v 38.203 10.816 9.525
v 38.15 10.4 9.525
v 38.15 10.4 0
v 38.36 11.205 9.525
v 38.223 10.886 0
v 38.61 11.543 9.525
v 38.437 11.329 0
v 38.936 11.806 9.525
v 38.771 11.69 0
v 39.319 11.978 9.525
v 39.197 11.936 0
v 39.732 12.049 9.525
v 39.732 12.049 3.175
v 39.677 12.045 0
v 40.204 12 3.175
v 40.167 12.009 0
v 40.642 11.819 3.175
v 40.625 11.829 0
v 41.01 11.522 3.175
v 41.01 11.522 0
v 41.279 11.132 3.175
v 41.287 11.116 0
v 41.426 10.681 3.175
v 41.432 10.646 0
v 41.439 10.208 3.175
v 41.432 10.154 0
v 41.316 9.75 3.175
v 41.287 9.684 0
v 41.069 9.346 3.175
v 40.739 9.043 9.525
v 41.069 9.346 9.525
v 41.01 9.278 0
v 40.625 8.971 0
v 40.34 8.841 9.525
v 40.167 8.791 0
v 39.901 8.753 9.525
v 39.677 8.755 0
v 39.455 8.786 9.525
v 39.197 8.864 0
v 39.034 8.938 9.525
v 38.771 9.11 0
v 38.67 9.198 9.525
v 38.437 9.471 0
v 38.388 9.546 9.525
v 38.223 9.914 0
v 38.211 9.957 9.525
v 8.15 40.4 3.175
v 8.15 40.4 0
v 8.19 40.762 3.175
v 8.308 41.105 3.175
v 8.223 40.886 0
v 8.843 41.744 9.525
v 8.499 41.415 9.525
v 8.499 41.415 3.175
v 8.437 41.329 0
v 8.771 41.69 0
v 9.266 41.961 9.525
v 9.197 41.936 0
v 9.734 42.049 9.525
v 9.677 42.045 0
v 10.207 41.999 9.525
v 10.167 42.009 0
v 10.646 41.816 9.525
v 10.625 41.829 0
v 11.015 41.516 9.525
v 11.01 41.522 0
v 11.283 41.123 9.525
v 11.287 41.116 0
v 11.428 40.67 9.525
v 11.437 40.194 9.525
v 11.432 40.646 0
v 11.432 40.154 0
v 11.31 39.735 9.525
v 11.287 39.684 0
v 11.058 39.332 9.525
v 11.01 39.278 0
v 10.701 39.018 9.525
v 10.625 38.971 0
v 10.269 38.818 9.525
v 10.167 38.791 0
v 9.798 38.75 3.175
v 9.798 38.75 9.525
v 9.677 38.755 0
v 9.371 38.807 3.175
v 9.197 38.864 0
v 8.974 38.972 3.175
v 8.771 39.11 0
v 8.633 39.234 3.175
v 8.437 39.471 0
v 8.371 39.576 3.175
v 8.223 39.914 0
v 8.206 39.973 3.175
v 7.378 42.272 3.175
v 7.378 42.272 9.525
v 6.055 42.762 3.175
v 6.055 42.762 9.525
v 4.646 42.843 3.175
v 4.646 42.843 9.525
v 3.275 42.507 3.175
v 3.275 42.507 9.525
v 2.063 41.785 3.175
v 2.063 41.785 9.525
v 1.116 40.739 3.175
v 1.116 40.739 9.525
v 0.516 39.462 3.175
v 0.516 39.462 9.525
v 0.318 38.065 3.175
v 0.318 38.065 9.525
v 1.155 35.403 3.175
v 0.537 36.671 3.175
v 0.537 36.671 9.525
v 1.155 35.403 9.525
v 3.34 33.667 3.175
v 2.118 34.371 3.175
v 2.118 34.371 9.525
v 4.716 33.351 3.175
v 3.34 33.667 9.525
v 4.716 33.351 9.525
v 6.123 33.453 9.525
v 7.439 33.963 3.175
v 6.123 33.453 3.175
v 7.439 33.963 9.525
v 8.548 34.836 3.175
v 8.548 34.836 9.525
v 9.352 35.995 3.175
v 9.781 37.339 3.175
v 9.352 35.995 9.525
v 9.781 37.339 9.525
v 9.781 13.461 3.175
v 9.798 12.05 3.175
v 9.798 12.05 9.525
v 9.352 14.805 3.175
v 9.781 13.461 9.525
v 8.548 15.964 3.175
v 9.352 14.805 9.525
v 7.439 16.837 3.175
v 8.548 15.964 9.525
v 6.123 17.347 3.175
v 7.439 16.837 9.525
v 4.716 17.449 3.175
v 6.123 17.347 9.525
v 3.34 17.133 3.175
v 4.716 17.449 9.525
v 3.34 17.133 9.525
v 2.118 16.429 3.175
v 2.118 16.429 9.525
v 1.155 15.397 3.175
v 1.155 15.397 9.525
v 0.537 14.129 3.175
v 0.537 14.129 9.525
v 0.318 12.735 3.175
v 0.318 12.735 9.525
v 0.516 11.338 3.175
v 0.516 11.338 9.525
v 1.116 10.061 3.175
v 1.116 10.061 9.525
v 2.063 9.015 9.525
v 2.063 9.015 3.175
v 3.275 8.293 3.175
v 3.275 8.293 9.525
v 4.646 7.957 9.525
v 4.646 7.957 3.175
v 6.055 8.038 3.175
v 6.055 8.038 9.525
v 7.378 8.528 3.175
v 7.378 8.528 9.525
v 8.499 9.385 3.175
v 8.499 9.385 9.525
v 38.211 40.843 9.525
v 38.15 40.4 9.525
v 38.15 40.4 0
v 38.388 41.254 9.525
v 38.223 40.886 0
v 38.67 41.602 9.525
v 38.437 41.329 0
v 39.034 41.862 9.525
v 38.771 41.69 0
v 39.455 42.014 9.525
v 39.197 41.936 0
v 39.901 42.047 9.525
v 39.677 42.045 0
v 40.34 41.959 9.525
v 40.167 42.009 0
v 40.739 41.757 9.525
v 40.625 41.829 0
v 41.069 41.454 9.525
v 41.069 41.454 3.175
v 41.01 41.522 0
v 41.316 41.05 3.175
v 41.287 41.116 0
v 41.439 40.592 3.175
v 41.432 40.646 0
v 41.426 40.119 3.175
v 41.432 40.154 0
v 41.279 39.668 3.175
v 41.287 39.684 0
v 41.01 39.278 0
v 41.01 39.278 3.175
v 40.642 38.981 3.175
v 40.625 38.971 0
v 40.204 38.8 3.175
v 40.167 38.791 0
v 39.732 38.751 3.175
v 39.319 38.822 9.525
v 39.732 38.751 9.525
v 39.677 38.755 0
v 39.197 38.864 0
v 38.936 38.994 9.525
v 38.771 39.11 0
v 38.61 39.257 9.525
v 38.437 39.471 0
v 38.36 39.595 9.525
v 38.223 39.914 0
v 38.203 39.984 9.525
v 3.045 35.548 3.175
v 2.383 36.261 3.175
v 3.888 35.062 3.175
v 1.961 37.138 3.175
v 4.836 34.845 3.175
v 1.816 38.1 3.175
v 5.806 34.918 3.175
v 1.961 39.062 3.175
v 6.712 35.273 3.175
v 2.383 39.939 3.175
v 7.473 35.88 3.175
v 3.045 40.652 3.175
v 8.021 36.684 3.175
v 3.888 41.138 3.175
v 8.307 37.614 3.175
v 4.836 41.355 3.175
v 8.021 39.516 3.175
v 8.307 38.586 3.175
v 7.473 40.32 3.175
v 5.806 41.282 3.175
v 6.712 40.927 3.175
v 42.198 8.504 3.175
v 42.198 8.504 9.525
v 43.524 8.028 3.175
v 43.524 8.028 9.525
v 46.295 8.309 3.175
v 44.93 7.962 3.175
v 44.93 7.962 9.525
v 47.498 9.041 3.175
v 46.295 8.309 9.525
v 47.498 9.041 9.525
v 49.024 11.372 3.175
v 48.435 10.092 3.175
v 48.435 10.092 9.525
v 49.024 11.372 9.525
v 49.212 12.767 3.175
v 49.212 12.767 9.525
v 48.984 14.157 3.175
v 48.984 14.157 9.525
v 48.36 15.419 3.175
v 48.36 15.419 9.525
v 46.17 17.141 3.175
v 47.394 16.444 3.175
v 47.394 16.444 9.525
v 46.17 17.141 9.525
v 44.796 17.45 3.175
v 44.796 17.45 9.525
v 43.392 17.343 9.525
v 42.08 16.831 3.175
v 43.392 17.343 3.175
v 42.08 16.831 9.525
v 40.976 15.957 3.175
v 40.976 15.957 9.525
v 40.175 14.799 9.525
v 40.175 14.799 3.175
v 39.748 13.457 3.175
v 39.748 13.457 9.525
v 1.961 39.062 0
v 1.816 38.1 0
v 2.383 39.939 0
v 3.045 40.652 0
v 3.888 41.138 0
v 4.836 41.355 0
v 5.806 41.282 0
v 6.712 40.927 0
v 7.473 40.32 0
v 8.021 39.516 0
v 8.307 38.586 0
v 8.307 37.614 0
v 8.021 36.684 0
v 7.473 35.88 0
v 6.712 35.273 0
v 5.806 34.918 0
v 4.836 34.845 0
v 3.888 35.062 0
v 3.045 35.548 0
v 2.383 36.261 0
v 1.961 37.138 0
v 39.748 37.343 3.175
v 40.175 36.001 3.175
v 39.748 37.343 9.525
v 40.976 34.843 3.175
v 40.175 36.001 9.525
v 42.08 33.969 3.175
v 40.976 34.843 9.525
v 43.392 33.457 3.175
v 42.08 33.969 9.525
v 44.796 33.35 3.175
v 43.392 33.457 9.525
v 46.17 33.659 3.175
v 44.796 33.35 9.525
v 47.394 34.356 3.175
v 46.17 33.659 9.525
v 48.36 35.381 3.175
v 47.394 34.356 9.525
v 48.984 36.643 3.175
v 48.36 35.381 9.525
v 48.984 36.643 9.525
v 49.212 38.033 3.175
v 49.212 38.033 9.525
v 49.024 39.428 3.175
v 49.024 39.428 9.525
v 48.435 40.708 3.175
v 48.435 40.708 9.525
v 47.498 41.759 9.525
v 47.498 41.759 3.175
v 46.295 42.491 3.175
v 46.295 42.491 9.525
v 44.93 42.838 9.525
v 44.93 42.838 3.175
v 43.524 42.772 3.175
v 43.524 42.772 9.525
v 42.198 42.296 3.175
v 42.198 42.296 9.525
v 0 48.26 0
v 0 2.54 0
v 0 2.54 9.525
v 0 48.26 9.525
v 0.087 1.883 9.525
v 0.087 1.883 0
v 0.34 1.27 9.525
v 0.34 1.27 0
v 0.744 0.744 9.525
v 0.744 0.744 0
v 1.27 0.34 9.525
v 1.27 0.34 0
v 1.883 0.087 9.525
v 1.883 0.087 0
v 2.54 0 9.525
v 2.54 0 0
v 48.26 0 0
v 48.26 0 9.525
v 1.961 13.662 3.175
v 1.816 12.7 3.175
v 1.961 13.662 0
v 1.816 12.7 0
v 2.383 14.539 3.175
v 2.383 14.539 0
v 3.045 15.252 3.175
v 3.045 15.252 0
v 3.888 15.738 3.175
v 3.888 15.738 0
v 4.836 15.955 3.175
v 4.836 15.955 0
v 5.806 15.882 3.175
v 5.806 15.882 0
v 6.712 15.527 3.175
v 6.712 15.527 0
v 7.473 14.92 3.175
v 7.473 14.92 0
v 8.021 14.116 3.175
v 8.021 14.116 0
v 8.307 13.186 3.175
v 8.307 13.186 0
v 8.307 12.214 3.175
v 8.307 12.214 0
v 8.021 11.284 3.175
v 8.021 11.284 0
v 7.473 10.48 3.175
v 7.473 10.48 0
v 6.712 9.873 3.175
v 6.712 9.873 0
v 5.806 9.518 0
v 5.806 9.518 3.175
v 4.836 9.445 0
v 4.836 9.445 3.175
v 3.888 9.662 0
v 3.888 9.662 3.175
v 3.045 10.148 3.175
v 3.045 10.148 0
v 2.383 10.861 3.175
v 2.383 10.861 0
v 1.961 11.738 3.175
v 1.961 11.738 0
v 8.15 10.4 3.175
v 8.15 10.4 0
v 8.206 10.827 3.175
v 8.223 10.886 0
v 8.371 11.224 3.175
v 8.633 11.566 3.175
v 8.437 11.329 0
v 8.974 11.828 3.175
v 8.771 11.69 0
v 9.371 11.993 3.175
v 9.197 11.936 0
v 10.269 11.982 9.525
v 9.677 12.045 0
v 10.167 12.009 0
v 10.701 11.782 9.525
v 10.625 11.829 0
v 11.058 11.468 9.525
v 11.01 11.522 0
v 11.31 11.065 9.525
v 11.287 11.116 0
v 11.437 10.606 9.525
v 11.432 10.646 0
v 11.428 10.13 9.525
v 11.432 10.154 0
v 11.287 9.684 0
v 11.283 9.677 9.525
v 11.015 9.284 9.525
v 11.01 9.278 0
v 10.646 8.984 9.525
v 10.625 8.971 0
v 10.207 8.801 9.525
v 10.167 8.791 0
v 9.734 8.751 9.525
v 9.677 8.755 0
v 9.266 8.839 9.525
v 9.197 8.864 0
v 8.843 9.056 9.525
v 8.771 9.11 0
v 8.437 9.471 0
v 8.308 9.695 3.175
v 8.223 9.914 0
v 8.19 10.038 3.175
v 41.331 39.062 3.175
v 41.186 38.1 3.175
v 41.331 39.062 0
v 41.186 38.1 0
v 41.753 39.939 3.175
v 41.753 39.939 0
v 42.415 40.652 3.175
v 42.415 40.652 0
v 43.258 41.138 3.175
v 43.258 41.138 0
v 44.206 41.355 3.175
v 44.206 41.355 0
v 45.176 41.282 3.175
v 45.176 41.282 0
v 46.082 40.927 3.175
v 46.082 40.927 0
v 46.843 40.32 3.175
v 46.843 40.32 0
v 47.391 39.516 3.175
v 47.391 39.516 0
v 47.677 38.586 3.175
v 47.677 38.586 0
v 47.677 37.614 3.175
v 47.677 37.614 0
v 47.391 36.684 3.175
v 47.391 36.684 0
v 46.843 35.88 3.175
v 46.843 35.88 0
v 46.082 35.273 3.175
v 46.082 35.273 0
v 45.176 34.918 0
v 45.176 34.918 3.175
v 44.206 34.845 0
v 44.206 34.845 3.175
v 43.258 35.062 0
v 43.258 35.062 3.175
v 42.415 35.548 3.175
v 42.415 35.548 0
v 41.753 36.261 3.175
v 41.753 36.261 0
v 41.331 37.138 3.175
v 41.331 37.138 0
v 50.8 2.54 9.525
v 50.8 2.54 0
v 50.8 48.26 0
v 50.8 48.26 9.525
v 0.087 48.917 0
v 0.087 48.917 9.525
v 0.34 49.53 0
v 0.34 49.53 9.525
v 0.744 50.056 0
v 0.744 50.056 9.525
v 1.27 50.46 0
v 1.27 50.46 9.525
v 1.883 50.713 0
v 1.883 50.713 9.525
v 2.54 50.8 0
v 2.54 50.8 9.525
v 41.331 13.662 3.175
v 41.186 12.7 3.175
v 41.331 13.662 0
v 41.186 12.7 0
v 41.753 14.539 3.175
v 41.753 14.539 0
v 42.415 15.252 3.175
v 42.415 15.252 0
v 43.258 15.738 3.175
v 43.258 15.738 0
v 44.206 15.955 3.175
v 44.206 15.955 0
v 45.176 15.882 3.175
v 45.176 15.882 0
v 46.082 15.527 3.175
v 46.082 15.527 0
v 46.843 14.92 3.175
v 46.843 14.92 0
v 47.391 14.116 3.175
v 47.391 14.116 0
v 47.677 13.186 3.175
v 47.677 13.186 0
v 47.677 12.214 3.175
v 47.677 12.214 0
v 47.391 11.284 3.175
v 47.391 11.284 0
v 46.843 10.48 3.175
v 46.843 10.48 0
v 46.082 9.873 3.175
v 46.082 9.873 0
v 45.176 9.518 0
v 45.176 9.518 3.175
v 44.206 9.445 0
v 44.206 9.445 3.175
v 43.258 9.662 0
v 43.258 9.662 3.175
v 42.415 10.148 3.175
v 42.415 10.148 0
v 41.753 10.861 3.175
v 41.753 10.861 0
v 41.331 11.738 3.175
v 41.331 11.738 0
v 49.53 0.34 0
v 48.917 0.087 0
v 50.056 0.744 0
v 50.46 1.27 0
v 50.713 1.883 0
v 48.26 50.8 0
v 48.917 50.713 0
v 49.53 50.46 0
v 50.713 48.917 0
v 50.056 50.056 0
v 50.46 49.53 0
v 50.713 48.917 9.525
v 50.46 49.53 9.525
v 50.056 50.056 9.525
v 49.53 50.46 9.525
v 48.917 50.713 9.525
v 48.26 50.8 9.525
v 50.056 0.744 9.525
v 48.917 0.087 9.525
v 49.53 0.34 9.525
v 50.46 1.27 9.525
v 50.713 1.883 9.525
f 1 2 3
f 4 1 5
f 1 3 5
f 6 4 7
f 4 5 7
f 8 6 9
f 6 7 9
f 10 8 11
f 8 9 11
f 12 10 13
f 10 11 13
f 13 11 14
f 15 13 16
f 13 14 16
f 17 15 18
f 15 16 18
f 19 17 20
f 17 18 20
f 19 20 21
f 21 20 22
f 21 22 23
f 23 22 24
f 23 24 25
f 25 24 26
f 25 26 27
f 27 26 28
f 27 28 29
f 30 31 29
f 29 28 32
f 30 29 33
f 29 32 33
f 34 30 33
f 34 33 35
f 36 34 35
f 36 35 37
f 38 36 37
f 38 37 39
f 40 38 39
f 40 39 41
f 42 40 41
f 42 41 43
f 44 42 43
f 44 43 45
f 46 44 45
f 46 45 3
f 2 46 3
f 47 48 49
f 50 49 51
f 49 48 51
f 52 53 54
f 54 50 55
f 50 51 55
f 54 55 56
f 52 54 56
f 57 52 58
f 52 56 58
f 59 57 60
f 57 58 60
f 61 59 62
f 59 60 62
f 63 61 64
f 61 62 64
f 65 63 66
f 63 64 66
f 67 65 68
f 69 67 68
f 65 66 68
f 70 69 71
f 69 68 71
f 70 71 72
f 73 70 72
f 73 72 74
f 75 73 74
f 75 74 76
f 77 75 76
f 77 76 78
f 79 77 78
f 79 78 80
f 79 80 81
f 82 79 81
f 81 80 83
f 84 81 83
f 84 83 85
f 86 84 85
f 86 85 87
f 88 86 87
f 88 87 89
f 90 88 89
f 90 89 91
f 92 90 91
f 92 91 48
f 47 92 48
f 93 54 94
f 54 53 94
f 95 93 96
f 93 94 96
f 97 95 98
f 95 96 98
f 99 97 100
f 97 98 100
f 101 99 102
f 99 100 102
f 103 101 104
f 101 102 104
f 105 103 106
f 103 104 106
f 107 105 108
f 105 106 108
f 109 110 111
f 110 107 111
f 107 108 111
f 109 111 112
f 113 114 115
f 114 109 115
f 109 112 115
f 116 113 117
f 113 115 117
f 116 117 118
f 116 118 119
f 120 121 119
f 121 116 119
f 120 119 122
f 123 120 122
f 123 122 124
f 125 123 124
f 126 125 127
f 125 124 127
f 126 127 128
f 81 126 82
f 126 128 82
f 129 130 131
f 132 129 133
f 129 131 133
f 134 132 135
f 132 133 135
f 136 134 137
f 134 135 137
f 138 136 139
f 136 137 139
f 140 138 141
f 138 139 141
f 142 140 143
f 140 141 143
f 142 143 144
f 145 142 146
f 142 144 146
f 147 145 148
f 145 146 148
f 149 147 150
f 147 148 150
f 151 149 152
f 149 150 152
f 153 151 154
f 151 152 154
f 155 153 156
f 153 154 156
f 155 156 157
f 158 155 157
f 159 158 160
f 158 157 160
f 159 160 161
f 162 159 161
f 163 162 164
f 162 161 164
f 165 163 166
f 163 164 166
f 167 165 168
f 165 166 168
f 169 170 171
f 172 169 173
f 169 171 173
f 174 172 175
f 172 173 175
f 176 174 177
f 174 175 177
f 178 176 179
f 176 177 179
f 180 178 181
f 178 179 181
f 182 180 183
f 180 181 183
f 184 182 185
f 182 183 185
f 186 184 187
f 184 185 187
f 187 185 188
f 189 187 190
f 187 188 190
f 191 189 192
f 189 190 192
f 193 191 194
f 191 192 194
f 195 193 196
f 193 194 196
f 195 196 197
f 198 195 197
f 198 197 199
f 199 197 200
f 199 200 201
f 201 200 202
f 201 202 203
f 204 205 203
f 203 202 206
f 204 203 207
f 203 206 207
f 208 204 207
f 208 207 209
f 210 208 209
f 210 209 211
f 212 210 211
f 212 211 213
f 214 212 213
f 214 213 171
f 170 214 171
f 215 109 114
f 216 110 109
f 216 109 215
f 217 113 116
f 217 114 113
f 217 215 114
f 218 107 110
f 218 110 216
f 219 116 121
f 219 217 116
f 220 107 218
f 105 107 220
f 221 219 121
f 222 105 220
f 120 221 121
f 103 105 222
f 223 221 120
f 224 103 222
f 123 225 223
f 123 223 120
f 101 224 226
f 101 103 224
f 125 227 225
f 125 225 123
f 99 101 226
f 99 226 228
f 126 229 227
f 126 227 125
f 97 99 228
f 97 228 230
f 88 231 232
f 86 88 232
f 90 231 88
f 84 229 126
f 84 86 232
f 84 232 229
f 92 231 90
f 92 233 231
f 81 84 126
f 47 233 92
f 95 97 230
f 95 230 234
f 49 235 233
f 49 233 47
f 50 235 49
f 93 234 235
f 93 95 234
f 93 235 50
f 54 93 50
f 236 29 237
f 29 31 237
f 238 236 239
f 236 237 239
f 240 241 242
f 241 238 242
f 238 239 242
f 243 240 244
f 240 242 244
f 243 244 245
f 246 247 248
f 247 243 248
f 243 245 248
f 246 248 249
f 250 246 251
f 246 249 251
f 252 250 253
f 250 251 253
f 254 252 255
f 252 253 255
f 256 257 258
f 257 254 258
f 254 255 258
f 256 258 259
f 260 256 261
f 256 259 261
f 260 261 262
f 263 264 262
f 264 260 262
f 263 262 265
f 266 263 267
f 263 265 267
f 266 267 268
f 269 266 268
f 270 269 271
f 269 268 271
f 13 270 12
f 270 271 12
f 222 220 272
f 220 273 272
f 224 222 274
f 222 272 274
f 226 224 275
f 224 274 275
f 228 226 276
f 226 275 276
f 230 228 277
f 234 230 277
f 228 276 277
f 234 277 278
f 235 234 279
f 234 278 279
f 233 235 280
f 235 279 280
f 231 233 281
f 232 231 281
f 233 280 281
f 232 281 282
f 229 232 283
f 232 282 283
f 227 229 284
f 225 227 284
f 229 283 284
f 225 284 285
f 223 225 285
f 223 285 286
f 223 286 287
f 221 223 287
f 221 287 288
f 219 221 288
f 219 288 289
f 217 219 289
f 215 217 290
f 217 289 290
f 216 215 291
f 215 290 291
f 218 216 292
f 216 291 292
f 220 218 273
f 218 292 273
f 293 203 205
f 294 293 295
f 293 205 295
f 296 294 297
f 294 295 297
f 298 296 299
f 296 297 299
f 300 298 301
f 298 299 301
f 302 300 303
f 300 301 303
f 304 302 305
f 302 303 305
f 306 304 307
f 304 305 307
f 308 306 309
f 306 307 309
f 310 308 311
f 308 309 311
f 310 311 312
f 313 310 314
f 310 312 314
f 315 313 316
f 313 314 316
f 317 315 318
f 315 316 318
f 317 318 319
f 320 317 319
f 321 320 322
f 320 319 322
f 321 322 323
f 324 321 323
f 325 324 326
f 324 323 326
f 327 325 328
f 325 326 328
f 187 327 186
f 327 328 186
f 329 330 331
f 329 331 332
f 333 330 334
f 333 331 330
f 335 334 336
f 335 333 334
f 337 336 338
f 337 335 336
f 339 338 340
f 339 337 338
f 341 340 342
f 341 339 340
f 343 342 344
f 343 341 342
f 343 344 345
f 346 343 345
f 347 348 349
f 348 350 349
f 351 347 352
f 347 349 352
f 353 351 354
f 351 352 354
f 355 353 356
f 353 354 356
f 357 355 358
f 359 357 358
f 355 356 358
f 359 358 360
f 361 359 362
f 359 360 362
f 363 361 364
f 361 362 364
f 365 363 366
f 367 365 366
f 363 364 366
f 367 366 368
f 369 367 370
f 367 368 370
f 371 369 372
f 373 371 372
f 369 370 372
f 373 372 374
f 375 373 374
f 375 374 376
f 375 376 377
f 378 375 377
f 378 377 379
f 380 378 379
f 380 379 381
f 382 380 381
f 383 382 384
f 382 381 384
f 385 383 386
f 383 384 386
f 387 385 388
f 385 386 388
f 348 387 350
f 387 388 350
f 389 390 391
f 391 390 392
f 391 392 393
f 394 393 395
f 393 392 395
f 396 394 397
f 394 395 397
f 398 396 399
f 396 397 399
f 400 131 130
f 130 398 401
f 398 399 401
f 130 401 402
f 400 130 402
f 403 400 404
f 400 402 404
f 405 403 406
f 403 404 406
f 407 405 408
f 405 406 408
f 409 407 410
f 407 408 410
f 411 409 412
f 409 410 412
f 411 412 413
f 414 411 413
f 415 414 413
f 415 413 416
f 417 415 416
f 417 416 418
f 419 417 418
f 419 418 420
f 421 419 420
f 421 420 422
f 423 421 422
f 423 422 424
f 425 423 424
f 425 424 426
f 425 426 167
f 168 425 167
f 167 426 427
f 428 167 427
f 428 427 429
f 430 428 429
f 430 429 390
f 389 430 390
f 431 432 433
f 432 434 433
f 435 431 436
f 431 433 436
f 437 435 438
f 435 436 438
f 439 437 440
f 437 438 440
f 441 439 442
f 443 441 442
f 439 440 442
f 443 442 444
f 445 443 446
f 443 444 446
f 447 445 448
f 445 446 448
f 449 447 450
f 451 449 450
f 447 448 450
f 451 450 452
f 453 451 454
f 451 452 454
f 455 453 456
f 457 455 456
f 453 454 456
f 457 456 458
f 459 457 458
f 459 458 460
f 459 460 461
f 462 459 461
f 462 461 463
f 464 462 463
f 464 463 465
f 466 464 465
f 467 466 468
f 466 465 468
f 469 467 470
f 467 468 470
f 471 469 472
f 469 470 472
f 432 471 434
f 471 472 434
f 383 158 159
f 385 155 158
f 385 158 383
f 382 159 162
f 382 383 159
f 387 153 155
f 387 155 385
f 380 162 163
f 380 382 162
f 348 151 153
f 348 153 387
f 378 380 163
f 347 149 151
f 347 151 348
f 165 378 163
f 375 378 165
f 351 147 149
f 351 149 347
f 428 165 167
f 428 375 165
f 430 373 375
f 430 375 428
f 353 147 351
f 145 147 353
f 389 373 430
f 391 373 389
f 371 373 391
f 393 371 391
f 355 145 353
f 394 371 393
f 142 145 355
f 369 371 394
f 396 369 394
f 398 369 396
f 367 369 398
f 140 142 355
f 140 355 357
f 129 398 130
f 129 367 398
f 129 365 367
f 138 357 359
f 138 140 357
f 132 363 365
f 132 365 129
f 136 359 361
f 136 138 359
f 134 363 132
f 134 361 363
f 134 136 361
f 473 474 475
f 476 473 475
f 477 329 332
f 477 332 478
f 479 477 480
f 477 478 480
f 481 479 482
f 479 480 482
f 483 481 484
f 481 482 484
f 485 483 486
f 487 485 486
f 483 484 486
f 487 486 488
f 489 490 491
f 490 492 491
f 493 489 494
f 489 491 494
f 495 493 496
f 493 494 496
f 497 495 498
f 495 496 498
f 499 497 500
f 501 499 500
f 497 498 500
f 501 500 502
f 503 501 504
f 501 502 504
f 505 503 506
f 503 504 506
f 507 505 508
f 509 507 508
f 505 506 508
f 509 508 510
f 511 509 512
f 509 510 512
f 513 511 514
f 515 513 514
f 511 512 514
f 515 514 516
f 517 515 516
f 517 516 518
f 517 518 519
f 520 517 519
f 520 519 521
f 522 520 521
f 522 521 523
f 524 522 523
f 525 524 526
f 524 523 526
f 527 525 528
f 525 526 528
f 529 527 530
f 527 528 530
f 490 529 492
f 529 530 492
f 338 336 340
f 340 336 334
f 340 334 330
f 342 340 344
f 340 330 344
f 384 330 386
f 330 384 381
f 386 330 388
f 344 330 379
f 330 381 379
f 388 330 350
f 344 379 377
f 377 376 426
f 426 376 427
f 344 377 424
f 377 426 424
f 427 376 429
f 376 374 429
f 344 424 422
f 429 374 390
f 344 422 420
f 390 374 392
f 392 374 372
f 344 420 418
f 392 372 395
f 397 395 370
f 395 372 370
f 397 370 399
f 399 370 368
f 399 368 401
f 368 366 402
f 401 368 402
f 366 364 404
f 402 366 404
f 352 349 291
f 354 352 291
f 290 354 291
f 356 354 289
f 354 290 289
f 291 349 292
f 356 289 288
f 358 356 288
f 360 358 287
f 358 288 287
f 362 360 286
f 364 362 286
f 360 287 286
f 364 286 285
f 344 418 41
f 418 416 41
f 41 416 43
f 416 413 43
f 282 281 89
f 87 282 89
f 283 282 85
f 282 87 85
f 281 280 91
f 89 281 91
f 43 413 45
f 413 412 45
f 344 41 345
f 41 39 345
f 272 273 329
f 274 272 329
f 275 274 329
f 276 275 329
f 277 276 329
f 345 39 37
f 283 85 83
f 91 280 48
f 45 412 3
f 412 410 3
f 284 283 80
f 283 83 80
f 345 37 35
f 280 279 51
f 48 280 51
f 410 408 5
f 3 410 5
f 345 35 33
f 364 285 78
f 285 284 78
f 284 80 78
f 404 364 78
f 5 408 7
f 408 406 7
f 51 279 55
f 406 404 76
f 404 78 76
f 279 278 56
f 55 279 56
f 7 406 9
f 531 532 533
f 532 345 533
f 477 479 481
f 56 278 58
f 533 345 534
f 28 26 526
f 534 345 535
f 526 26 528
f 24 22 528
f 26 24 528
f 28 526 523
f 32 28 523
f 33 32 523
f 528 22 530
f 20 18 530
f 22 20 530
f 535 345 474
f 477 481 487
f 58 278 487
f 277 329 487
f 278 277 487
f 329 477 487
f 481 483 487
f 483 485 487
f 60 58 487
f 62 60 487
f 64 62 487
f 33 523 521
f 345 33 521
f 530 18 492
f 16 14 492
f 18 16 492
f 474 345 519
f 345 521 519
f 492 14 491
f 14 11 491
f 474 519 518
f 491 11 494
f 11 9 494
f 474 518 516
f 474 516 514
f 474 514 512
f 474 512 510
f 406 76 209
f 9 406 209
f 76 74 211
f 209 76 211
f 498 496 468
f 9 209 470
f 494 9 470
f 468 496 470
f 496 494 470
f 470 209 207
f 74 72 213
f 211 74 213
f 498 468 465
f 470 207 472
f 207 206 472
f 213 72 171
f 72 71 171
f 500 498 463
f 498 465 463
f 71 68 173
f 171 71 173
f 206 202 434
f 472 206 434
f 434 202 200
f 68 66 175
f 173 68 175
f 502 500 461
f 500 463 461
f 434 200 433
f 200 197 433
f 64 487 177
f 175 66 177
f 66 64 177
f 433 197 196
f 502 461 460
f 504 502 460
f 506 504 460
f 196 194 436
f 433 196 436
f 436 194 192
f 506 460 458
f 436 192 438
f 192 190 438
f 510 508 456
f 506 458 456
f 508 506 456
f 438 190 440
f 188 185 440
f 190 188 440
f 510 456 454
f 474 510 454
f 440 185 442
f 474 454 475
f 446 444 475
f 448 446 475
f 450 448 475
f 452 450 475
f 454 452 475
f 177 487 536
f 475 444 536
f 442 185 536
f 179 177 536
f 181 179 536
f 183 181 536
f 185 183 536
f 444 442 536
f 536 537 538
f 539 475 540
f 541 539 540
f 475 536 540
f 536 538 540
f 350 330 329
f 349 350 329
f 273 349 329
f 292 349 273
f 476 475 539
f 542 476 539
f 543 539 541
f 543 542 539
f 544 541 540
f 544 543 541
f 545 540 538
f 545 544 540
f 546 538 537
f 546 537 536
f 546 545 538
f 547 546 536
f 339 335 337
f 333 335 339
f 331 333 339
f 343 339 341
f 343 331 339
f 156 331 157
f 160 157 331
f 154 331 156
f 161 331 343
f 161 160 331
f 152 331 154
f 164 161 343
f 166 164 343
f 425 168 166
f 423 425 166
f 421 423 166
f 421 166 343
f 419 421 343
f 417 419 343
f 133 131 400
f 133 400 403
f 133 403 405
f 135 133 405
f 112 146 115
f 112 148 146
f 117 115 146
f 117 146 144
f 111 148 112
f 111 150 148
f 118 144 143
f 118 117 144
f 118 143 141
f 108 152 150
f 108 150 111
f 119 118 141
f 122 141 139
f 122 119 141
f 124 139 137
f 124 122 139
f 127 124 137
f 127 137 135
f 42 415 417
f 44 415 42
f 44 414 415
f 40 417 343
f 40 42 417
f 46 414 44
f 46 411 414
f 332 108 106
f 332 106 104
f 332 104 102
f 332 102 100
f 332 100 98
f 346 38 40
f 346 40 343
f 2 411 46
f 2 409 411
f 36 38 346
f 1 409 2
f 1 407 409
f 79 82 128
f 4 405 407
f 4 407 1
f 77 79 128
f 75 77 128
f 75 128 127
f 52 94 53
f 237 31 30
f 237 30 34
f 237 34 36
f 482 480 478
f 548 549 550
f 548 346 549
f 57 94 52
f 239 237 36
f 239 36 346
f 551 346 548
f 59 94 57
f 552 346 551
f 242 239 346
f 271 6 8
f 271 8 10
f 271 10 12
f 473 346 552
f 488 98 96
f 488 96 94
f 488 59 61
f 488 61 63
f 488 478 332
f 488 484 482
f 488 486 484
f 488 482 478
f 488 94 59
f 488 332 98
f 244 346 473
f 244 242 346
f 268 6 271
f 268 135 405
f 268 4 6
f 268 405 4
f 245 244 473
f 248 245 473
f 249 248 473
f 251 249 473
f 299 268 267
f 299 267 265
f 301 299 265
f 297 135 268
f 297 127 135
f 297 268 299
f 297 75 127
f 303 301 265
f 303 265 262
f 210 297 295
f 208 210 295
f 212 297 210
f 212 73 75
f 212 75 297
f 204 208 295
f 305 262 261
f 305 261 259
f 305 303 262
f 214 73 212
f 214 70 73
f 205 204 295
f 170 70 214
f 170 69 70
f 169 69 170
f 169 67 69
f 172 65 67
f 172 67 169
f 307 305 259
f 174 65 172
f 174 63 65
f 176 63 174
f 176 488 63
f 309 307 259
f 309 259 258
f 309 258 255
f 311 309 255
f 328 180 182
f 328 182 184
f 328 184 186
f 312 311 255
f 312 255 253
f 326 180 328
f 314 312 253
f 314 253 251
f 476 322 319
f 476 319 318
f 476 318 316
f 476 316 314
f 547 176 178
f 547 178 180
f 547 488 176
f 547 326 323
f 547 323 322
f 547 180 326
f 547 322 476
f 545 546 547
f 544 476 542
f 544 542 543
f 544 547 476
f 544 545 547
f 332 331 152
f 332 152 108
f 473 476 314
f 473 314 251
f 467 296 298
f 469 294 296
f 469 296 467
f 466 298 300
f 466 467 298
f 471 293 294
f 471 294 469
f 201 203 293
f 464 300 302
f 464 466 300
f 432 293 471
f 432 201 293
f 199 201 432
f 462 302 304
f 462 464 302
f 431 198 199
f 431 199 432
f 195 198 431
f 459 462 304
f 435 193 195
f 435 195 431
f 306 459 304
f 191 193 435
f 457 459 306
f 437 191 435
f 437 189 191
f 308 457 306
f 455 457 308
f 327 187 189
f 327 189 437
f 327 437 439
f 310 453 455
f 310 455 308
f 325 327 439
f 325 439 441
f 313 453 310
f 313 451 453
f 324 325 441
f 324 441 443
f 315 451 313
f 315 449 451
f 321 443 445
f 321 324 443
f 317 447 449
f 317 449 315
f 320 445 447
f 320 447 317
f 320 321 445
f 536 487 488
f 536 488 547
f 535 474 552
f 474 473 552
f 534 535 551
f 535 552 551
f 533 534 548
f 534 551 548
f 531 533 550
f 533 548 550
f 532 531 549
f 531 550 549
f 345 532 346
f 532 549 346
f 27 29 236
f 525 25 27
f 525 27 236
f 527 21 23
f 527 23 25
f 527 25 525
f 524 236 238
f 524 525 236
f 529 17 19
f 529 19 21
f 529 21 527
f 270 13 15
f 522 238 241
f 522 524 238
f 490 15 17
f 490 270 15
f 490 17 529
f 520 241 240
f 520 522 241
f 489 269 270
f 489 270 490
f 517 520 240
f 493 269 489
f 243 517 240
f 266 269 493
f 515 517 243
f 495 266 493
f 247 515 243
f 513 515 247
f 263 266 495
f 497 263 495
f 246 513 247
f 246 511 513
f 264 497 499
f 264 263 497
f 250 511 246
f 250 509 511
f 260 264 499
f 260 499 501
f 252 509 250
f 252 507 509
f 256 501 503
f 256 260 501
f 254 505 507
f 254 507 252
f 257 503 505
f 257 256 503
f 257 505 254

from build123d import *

# Parameters (mm, degrees)
SKETCH1_W                                        = 50.8
SKETCH1_H                                        = 50.8
BOSS_EXTRUDE1_DEPTH                              = 9.525
TAP_DRILL_FOR_M4X0_7_TAP1_D                      = 3.3
CBORE_FOR_1_4_SOCKET_HEAD_CAP_SCREW1_D           = 6.5278
CBORE_FOR_1_4_SOCKET_HEAD_CAP_SCREW1_CBORE_D     = 9.525
CBORE_FOR_1_4_SOCKET_HEAD_CAP_SCREW1_CBORE_DEPTH = 6.35
FILLET1_R                                        = 2.54


with BuildPart() as part:
    # Sketch1 → Boss-Extrude1 (new body)
    with BuildSketch(Plane.XY):
        with Locations((25.4, 25.4)):
            Rectangle(SKETCH1_W, SKETCH1_H)
    extrude(amount=BOSS_EXTRUDE1_DEPTH)

    # Tap Drill for M4x0.7 Tap1 (through all)
    with Locations(Plane.XY.offset(9.525)):
        with Locations((39.8, 10.4), (39.8, 40.4), (9.8, 40.4), (9.8, 10.4)):
            Hole(TAP_DRILL_FOR_M4X0_7_TAP1_D / 2)

    # CBORE for 1/4 Socket Head Cap Screw1 (through all)
    with Locations(Plane.XY.offset(9.525)):
        with Locations((44.45, 12.7), (44.45, 38.1), (5.08, 12.7), (5.08, 38.1)):
            CounterBoreHole(CBORE_FOR_1_4_SOCKET_HEAD_CAP_SCREW1_D / 2, CBORE_FOR_1_4_SOCKET_HEAD_CAP_SCREW1_CBORE_D / 2, CBORE_FOR_1_4_SOCKET_HEAD_CAP_SCREW1_CBORE_DEPTH)

    # Fillet1
    fillet1_edges = [part.edges().sort_by_distance(p)[0] for p in [
        (0, 50.8, 4.7625),
        (50.8, 50.8, 4.7625),
        (50.8, 0, 4.7625),
        (0, 0, 4.7625),
    ]]
    fillet(fillet1_edges, radius=FILLET1_R)


solid = part.part
